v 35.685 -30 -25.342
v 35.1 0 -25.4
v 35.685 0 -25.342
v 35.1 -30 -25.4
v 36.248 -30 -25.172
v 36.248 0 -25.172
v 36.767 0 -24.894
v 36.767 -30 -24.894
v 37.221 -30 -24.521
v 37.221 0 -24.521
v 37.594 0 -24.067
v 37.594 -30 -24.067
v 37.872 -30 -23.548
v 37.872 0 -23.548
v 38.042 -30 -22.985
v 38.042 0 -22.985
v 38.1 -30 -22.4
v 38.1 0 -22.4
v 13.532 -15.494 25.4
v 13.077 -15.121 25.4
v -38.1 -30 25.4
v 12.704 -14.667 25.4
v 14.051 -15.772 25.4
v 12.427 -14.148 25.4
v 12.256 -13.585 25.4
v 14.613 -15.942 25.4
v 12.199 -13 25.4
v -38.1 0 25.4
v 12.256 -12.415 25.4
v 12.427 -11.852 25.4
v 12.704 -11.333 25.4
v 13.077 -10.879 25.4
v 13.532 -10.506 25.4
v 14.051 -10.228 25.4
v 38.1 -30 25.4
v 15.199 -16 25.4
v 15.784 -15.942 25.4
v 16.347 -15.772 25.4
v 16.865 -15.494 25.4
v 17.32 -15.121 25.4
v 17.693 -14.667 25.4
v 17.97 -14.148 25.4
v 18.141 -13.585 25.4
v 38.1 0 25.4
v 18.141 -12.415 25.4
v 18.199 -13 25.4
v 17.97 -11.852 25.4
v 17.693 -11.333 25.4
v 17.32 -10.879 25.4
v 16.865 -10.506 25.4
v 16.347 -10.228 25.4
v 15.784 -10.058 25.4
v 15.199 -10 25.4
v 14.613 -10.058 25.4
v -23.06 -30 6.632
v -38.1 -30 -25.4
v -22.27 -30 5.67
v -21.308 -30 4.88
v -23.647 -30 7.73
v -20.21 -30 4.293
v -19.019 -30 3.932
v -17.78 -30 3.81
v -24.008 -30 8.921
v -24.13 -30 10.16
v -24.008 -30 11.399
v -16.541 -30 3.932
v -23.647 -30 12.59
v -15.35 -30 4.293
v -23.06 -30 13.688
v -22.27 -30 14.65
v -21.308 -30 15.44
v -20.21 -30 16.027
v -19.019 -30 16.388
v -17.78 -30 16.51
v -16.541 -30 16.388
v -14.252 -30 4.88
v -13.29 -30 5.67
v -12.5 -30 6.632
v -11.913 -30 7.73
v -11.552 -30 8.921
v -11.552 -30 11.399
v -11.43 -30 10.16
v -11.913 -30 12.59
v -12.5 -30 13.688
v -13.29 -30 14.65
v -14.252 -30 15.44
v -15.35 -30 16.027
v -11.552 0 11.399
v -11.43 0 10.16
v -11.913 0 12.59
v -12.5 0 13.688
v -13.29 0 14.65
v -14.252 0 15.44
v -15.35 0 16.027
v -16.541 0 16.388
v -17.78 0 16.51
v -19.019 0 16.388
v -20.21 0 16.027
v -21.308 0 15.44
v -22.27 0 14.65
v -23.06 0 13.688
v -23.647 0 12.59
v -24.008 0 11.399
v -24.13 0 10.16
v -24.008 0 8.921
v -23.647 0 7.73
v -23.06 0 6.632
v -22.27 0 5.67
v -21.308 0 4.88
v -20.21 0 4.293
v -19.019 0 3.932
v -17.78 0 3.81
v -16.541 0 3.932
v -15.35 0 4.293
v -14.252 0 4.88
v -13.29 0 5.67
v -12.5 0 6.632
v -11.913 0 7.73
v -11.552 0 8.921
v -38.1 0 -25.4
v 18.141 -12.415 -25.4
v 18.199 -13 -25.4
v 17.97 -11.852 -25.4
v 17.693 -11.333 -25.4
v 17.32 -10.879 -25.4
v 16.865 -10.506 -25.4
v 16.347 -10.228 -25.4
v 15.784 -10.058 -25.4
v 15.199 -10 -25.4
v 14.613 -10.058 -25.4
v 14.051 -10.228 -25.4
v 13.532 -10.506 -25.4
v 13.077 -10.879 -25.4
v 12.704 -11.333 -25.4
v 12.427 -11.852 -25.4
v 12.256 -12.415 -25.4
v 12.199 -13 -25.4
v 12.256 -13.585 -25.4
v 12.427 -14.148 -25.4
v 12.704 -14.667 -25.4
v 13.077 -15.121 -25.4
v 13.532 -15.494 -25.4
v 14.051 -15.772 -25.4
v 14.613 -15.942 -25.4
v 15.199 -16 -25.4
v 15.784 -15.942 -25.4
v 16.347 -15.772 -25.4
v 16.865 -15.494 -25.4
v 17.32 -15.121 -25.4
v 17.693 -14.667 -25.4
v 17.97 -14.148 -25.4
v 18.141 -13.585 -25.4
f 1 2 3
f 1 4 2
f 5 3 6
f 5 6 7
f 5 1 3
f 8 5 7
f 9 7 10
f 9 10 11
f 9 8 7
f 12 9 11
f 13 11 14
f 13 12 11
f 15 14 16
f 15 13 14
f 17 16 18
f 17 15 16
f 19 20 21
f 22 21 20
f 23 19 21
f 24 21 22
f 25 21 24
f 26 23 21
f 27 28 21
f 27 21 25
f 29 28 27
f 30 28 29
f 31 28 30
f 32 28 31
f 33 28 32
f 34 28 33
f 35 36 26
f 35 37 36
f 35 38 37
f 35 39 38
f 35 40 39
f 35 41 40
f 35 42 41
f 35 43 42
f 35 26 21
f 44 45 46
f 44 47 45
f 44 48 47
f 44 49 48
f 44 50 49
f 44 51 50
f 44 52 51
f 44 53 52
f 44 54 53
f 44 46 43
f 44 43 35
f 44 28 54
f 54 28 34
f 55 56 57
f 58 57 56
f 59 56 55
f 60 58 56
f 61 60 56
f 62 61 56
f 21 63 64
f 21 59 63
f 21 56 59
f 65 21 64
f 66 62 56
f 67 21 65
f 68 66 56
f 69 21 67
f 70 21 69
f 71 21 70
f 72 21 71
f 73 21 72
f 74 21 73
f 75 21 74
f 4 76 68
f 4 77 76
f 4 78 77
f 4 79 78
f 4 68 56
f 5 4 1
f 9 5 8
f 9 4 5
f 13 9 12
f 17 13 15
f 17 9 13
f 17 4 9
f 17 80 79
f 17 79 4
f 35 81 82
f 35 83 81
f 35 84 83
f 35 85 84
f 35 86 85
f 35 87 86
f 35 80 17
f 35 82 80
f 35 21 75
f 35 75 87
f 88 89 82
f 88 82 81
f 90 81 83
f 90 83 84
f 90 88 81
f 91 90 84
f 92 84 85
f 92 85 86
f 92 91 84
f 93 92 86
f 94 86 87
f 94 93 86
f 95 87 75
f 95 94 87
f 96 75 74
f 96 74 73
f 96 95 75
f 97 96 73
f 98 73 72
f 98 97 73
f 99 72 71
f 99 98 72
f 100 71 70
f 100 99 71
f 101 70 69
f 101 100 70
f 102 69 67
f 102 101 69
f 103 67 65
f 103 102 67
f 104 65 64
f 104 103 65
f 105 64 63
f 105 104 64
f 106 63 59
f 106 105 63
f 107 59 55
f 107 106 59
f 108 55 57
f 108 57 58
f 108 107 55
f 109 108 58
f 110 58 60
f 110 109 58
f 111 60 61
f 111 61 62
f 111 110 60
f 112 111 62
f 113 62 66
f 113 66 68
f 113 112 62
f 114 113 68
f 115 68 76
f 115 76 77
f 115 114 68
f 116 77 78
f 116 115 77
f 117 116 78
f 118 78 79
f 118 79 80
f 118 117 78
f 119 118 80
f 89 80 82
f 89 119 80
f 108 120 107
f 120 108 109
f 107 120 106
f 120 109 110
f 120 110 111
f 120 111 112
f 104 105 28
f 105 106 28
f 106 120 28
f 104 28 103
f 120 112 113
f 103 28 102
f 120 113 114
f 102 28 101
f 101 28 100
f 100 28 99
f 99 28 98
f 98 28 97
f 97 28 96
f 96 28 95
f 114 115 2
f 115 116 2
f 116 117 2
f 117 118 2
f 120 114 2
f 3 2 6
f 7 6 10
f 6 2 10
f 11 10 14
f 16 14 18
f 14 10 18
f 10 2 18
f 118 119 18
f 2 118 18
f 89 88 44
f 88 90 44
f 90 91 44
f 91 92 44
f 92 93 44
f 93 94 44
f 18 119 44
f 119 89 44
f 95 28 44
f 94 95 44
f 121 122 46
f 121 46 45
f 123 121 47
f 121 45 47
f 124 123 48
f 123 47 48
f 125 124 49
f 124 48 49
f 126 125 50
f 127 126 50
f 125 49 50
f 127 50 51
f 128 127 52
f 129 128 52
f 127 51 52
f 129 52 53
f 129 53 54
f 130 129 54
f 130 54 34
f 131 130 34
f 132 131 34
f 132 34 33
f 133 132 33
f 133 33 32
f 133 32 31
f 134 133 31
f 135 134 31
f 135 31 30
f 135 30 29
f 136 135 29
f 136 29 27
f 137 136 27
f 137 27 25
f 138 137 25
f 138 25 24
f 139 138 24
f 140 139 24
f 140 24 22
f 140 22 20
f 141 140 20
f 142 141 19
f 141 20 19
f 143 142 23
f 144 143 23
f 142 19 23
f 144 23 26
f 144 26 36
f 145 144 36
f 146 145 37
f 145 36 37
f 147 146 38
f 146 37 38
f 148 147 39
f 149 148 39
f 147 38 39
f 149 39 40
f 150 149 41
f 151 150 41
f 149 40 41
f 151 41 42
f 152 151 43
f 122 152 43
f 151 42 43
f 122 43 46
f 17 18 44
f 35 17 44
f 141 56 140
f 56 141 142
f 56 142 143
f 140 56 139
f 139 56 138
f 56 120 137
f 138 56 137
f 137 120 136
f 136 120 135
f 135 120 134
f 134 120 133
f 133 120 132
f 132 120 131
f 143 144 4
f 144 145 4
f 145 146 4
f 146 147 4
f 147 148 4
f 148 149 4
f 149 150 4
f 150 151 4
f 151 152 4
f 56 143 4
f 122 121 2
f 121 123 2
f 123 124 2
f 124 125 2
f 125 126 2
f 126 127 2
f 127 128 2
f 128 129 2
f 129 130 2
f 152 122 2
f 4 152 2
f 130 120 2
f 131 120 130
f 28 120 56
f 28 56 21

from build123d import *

# Parameters (mm, degrees)
F0_W     = 76.2
F0_H     = 50.8
F0_R     = 6.35
F1_DEPTH = 30
F2_R     = 3
F3_DEPTH = 50.801
F4_R     = 3


with BuildPart() as f1:
    # F0 (on Front) → F1 (new body)
    with BuildSketch(Plane.XZ):
        Rectangle(F0_W, F0_H)
        with Locations((-17.78, 10.16)):
            Circle(F0_R, mode=Mode.SUBTRACT)
    extrude(amount=F1_DEPTH)

    # F2 (on face) → F3 (cut, through all)
    with BuildSketch(Plane.XY.offset(25.4)):
        with Locations((15.198684, -13)):
            Circle(F2_R)
    extrude(amount=-F3_DEPTH, mode=Mode.SUBTRACT)

    # F4
    f4_edges = [f1.edges().sort_by_distance(p)[0] for p in [
        (38.1, -15, -25.4),
    ]]
    fillet(f4_edges, radius=F4_R)


solid = f1.part
